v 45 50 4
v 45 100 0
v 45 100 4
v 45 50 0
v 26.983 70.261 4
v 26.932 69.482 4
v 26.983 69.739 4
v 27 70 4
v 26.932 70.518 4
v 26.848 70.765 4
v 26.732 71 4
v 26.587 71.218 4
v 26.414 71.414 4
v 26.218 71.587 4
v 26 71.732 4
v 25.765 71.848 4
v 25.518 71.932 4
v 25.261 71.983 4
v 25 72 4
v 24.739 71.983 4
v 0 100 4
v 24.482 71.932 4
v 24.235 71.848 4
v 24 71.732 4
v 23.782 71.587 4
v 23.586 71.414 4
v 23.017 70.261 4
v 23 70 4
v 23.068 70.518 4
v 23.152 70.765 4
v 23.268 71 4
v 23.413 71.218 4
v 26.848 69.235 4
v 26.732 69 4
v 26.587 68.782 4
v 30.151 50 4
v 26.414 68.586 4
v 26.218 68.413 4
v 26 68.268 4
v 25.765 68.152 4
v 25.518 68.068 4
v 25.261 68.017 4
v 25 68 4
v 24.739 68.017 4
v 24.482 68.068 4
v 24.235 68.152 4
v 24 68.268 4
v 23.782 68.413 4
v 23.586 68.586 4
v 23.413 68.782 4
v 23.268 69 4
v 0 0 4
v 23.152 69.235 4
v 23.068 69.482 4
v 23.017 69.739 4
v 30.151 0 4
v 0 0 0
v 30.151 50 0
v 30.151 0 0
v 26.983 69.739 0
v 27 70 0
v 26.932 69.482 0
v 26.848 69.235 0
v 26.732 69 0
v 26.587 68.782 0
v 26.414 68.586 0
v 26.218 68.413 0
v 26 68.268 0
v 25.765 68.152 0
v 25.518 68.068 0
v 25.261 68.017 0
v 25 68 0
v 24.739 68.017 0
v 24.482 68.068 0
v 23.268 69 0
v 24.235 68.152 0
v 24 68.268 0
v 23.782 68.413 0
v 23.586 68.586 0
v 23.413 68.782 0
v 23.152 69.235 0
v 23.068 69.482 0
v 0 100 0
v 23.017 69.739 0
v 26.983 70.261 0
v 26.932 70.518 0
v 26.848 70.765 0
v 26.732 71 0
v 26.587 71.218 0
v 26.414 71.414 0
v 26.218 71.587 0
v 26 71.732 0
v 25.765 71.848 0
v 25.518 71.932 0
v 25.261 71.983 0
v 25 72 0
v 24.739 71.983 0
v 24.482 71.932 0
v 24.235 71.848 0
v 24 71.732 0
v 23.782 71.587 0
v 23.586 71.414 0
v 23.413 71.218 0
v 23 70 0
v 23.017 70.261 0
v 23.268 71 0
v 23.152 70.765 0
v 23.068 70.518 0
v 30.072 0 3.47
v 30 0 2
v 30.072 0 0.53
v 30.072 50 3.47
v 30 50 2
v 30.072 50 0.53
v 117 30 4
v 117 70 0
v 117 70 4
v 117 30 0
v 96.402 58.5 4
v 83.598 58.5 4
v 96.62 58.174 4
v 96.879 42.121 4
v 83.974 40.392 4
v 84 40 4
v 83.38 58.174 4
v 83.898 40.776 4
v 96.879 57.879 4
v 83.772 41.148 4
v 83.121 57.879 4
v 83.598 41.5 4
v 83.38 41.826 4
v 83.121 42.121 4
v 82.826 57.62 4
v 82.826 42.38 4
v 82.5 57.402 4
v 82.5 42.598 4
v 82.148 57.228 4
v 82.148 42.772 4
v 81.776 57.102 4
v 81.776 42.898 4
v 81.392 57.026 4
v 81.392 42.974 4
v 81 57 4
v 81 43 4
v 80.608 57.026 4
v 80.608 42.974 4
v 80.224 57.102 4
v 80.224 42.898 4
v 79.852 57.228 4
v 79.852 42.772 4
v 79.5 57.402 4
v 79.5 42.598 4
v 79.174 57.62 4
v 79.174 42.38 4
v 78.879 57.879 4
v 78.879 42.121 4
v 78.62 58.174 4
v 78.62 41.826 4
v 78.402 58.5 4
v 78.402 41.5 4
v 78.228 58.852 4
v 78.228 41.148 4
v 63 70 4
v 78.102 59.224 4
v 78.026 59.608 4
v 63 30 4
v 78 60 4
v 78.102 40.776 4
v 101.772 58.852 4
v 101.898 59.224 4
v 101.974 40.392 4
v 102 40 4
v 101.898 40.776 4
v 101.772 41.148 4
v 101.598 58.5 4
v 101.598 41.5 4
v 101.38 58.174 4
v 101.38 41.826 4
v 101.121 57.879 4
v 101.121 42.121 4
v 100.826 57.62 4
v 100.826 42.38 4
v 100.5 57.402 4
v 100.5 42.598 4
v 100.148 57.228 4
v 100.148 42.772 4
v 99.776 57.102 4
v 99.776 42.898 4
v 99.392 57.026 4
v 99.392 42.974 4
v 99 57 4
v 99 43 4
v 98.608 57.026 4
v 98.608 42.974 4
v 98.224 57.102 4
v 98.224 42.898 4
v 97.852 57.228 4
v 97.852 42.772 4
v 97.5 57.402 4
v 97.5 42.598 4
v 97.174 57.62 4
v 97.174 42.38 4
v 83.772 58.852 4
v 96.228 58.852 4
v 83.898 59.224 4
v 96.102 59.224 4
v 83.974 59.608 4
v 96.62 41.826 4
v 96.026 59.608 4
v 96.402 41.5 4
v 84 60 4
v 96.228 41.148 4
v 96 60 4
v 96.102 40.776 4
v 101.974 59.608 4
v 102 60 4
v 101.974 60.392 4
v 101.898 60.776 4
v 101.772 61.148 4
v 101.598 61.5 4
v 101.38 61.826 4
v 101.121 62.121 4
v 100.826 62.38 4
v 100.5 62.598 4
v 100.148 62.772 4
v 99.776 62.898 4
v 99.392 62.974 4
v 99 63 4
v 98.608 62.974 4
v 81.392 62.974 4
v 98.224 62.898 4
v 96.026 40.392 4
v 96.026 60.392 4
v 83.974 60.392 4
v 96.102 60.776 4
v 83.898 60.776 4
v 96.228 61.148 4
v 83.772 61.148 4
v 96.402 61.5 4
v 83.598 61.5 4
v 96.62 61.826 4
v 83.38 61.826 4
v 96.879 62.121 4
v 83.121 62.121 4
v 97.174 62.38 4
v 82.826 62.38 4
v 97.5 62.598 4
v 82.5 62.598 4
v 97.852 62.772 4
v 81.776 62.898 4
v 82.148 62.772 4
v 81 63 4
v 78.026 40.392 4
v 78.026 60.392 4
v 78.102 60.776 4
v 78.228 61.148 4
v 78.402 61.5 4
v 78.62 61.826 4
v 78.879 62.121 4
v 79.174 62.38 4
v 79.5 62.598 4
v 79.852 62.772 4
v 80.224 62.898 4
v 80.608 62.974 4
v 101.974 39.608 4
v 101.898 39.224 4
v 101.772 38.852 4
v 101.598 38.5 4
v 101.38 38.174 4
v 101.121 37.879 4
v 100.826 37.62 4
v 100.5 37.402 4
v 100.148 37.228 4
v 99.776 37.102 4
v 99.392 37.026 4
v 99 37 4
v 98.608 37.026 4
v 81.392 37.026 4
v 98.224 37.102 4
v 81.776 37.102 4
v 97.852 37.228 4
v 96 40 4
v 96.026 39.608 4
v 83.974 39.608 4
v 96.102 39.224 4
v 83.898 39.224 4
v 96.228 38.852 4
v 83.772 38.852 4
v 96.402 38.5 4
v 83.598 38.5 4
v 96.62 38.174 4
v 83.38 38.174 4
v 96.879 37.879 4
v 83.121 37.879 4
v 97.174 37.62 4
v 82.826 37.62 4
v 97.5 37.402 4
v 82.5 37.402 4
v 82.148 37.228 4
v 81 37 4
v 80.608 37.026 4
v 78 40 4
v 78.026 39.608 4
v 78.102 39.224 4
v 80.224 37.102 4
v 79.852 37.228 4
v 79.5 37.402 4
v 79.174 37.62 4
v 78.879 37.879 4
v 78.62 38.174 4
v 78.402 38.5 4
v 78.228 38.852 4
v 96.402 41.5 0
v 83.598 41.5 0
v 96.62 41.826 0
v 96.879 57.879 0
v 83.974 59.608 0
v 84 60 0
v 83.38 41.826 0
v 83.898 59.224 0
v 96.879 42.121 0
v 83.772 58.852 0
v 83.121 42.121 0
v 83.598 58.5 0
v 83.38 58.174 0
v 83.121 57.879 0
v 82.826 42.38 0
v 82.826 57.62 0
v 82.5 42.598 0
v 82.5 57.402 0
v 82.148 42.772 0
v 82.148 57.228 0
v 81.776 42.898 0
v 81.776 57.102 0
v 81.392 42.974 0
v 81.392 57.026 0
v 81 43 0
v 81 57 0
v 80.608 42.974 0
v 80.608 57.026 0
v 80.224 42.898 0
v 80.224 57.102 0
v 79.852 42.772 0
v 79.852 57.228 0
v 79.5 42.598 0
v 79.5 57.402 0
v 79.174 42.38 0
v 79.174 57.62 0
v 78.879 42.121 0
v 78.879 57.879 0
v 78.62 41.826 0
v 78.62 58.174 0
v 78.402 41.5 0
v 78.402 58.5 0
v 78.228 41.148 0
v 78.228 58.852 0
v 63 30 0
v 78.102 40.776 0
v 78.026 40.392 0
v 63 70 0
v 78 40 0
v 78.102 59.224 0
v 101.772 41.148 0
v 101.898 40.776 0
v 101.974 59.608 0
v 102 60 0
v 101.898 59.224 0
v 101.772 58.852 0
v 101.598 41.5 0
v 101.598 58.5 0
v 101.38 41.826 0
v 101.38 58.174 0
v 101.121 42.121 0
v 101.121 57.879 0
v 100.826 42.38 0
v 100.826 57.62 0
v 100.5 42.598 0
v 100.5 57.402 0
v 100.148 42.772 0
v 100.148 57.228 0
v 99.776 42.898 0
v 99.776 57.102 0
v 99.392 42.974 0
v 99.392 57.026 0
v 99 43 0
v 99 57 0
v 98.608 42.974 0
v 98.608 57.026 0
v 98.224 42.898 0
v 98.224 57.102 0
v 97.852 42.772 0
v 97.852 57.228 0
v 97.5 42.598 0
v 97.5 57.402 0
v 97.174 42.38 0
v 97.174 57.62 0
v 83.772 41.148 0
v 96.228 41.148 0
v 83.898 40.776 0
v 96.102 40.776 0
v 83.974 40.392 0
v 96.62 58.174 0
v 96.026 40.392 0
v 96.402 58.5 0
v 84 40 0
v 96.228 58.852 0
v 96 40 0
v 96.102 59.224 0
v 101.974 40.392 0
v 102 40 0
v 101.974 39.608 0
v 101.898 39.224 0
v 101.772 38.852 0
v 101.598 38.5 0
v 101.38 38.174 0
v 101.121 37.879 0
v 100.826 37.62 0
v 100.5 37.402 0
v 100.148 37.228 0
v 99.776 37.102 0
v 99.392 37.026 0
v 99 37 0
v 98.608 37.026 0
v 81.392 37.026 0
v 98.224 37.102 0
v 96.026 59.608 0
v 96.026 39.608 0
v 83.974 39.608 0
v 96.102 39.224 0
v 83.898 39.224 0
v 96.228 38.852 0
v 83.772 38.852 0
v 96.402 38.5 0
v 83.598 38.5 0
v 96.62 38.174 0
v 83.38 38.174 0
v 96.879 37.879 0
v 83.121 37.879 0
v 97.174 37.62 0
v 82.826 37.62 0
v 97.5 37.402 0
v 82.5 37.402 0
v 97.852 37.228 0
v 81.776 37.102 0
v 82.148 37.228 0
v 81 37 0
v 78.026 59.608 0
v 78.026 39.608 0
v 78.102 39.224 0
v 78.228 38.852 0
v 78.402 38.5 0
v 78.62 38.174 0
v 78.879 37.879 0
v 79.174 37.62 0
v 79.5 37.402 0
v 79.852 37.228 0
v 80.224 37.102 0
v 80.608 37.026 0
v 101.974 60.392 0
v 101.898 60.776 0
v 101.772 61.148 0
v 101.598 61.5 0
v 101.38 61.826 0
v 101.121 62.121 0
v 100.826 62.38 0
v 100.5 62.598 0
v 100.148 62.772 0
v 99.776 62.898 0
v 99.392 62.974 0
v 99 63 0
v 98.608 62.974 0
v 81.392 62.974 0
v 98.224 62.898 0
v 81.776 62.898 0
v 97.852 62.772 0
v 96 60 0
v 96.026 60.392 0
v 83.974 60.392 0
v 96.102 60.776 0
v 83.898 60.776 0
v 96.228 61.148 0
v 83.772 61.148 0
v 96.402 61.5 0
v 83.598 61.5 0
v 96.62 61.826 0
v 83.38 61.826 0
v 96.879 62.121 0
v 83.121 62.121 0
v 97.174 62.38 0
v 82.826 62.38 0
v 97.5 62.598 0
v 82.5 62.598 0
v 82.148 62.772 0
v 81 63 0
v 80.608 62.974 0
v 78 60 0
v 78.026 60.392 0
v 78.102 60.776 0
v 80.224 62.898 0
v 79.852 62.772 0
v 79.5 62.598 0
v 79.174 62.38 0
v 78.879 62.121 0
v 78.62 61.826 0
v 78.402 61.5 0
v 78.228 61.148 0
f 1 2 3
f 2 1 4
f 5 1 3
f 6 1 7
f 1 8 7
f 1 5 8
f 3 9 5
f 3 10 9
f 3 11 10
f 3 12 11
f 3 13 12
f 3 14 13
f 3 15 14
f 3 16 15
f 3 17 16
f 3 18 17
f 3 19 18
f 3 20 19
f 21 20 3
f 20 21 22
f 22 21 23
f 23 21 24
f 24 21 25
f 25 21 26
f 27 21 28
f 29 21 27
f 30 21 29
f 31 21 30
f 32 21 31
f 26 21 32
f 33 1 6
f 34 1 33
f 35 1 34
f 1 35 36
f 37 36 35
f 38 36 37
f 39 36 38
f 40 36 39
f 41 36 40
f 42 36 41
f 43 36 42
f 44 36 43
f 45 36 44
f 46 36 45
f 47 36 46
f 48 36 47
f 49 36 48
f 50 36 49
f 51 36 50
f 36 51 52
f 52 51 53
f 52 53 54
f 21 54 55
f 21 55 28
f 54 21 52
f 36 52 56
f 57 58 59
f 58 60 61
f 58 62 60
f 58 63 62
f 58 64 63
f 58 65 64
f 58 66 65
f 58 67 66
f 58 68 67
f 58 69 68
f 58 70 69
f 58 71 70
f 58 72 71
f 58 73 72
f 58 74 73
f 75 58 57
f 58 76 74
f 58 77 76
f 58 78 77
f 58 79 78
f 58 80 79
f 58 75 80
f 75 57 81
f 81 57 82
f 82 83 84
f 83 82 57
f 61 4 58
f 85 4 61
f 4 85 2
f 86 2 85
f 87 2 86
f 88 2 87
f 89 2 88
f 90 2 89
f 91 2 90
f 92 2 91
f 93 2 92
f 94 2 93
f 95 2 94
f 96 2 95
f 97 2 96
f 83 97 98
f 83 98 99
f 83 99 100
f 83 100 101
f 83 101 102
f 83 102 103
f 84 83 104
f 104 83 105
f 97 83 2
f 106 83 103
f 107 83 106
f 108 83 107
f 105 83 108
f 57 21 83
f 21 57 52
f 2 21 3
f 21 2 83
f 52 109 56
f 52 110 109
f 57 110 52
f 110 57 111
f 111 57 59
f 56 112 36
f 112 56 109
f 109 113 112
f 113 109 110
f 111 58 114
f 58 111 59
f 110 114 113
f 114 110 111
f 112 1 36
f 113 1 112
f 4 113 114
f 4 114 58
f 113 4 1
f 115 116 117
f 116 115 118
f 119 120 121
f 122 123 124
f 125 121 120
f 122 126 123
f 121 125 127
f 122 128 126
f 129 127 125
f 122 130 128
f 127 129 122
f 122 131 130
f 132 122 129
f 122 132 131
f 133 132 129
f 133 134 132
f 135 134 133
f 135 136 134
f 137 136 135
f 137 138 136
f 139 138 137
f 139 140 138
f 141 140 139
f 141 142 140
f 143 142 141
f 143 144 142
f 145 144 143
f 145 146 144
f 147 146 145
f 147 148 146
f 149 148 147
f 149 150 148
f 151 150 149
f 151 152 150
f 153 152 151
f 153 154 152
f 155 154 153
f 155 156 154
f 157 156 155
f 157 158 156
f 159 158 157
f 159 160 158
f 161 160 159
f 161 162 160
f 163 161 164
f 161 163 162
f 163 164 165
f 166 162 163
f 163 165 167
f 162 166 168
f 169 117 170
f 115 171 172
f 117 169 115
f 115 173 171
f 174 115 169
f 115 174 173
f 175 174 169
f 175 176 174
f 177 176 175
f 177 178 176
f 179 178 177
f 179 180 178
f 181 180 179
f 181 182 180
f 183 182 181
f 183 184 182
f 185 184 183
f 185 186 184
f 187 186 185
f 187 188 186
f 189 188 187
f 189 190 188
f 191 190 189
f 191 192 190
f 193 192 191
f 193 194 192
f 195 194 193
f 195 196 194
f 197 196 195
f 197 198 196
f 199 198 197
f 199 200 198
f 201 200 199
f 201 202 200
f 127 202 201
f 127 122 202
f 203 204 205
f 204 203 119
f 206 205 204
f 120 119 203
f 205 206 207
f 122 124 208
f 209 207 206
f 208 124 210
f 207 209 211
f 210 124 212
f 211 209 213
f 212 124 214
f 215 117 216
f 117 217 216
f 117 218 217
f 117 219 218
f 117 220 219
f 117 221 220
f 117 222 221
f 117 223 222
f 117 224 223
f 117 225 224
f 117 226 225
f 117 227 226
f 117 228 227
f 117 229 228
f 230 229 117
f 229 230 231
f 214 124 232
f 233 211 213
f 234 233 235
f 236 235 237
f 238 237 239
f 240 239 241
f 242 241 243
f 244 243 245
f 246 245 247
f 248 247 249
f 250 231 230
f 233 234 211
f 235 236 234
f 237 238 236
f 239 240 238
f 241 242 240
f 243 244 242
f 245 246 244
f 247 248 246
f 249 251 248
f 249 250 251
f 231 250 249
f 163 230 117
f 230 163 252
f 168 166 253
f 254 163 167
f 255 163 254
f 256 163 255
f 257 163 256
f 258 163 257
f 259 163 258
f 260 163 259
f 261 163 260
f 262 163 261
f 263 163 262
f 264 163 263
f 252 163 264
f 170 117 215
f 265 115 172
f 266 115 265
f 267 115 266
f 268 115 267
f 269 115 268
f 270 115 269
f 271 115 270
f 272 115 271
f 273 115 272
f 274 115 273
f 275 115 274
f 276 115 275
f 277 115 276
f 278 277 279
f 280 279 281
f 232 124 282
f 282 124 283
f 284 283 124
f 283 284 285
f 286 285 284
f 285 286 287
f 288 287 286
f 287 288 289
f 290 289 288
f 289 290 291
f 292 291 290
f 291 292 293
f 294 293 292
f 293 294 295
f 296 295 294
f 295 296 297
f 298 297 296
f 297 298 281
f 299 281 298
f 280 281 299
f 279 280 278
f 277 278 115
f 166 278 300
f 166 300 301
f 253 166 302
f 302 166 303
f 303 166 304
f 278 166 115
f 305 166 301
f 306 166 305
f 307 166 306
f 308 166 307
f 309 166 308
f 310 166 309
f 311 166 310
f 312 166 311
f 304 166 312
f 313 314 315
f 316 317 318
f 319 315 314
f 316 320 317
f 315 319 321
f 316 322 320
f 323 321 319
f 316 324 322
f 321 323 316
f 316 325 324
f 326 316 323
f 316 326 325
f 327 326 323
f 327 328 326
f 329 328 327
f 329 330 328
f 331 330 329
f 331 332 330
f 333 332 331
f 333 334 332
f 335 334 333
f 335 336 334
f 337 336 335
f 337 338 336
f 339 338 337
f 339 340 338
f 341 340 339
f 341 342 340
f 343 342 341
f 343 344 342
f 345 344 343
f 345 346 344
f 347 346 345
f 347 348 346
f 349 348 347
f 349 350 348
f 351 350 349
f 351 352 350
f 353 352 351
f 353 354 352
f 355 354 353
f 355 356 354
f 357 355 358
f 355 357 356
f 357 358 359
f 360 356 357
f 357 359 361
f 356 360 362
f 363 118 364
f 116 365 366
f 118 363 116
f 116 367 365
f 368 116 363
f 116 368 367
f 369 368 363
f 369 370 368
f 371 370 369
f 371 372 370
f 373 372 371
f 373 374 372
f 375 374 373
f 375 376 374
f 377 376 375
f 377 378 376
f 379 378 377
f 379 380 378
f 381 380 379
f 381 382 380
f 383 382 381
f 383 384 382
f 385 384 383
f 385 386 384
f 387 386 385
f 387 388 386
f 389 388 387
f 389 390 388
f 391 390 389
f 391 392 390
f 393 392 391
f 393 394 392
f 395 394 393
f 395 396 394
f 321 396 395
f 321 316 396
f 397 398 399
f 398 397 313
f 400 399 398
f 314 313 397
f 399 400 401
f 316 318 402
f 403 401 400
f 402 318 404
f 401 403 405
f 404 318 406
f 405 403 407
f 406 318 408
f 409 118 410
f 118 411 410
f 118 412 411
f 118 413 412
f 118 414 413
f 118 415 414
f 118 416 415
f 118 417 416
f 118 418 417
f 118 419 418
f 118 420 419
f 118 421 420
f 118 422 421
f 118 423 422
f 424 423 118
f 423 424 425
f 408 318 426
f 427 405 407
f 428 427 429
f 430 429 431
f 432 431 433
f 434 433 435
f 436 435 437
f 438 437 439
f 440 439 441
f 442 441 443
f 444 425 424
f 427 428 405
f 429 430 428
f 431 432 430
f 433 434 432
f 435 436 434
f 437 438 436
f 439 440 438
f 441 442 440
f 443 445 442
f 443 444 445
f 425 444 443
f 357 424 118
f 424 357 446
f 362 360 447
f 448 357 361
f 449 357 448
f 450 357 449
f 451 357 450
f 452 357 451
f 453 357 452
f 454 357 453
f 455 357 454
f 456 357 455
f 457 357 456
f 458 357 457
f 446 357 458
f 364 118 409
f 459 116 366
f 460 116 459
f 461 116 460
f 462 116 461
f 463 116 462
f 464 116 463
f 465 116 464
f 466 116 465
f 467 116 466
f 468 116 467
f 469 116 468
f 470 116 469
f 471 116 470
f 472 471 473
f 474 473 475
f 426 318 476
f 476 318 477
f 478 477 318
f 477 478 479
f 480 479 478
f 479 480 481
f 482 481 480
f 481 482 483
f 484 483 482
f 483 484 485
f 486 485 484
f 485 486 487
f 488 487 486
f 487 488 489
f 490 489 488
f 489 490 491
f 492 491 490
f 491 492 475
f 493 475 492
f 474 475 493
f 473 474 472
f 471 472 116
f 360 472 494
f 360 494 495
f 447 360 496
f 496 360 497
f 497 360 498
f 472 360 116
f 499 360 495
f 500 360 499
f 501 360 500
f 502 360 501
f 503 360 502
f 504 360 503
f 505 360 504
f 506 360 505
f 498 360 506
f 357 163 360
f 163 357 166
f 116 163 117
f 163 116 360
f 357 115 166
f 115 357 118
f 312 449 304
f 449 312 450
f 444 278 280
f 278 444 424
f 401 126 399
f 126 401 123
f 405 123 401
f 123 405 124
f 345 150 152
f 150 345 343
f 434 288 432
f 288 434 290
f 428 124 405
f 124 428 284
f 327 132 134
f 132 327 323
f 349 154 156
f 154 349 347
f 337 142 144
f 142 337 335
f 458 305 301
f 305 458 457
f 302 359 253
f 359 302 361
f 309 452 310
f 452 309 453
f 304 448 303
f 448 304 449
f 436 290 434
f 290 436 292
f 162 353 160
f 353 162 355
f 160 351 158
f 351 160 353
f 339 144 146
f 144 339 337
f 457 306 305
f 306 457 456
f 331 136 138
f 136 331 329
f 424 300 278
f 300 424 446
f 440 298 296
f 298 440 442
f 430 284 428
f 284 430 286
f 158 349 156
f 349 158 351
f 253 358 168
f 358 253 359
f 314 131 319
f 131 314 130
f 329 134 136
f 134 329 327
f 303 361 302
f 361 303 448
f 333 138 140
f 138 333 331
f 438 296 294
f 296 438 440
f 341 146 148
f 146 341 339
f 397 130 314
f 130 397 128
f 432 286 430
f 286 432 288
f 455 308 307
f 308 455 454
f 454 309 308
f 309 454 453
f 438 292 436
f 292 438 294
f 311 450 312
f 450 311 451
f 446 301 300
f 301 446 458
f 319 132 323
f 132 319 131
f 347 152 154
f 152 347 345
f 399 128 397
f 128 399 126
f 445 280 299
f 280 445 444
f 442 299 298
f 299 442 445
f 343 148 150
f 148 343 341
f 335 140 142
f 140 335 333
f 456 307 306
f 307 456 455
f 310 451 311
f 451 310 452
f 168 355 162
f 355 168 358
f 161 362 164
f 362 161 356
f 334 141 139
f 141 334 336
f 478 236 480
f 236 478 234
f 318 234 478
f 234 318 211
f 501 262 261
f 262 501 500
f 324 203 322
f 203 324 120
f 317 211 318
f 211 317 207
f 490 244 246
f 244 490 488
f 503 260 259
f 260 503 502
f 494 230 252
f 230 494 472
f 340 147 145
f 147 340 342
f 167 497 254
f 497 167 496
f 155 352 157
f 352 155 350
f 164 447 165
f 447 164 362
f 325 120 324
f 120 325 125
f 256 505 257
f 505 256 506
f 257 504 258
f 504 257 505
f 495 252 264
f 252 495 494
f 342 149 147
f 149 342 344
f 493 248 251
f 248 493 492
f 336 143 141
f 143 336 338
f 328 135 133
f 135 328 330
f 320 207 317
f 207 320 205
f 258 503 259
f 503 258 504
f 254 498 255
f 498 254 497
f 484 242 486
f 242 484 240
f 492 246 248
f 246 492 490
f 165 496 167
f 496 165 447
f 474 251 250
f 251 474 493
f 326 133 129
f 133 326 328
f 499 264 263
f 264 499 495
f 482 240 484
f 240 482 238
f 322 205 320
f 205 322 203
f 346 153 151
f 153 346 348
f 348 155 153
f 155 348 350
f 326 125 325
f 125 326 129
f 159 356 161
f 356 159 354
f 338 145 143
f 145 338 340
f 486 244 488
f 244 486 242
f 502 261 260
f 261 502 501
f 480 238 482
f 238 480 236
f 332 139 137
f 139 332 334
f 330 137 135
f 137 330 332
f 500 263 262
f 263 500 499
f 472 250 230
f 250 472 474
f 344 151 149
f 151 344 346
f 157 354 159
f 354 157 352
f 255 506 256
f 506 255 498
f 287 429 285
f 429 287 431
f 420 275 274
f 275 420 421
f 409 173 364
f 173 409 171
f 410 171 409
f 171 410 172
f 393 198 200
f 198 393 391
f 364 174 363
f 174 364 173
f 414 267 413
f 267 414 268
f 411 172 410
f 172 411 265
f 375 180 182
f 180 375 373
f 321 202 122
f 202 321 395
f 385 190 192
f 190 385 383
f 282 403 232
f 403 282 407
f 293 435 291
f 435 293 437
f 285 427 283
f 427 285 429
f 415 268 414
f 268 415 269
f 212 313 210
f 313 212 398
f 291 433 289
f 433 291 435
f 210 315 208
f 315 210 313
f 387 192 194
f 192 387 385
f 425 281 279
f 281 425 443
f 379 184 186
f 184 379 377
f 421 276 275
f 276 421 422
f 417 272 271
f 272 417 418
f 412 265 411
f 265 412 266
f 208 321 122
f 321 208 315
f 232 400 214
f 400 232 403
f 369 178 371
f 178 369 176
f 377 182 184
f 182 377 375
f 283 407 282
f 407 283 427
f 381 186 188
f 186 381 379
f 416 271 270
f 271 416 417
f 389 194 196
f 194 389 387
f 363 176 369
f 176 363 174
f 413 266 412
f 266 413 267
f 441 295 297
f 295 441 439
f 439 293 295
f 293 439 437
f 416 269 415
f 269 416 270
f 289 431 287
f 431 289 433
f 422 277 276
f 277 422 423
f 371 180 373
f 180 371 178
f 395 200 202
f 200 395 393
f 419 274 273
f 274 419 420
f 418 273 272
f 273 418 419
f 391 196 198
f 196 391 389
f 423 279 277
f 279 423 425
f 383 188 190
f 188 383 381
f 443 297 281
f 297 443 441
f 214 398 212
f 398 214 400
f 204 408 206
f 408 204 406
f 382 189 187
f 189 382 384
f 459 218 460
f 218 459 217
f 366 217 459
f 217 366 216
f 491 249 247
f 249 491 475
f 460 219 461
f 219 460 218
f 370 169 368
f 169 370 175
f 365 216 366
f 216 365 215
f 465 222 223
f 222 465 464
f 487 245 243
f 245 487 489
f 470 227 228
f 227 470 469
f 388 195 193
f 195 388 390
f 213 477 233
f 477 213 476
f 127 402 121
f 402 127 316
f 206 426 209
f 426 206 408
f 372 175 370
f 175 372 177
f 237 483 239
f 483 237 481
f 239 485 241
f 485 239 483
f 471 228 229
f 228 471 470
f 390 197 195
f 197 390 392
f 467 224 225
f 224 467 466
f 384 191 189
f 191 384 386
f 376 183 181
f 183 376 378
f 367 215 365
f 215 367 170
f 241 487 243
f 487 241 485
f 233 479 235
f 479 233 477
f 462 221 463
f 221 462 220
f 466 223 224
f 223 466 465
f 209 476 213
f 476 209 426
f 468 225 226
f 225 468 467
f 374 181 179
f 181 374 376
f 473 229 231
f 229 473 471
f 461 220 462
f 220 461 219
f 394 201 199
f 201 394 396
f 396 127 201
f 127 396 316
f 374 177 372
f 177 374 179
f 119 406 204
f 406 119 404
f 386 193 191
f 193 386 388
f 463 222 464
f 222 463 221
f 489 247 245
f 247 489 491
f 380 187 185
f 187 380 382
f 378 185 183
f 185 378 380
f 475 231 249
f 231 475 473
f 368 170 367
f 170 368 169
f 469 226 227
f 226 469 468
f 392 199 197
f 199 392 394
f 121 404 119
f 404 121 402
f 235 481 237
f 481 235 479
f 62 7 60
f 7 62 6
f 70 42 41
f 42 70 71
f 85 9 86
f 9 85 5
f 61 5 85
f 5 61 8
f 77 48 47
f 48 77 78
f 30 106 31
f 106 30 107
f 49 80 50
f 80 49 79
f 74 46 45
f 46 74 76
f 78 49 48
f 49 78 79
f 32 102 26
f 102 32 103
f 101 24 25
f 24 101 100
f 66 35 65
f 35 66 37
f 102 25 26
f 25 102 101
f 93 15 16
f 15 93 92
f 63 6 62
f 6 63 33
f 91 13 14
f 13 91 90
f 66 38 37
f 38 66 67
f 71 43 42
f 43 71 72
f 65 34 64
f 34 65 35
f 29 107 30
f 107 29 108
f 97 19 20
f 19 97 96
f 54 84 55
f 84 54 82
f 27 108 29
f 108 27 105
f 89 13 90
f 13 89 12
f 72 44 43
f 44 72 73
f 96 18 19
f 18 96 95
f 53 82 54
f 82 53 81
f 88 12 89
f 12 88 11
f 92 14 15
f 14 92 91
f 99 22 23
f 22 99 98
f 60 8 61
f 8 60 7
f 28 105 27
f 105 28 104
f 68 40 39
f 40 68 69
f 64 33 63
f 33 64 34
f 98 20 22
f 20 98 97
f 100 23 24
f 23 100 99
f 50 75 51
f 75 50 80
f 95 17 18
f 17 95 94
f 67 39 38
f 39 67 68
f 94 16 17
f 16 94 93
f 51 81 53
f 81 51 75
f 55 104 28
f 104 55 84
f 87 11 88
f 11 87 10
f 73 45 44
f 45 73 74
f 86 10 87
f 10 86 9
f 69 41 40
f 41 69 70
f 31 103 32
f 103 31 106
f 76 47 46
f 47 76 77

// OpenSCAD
// RADAR MOUNT BRACKET — wall/pole attachment
// Print: PA6-CF 0.16mm (highest structural strength, weather)
// Mounts the radar enclosure to a pole, wall, or fence
// 5 brackets for 5 radars
//
// Print: PA6-CF, ~30min per bracket

/* [Bracket Dimensions] */
BRACKET_W = 90;        // mm horizontal span
BRACKET_H = 100;       // mm vertical
BRACKET_THICK = 4;     // mm base thickness
POLE_DIA = 30;          // mm pole diameter (curved back)
WALL_HOLE_DIA = 6;      // mm M5 wall anchor hole

$fn = 48;

// The pole-clamp half (curved back)
module pole_clamp_half() {
    difference() {
        translate([0, 0, 0])
            cube([BRACKET_W/2, BRACKET_H, BRACKET_THICK]);
        translate([BRACKET_W/2, BRACKET_H/2, BRACKET_THICK/2])
            rotate([0, 0, 0])
            rotate([90, 0, 0])
            cylinder(h=BRACKET_H+1, d=POLE_DIA, $fn=64);
    }
}

difference() {
    union() {
        // Pole clamp
        pole_clamp_half();
        // Mount plate (extends to side with M5 holes)
        translate([BRACKET_W*0.7, BRACKET_H*0.3, 0])
            cube([BRACKET_W*0.6, BRACKET_H*0.4, BRACKET_THICK]);
    }
    // 4× M5 wall mount holes
    translate([BRACKET_W*0.9, BRACKET_H*0.4, -1])
        cylinder(h=BRACKET_THICK+2, d=WALL_HOLE_DIA);
    translate([BRACKET_W*0.9, BRACKET_H*0.6, -1])
        cylinder(h=BRACKET_THICK+2, d=WALL_HOLE_DIA);
    translate([BRACKET_W*1.1, BRACKET_H*0.4, -1])
        cylinder(h=BRACKET_THICK+2, d=WALL_HOLE_DIA);
    translate([BRACKET_W*1.1, BRACKET_H*0.6, -1])
        cylinder(h=BRACKET_THICK+2, d=WALL_HOLE_DIA);
    // Mount hole for the enclosure (M3 bolt to attach bottom)
    translate([25, BRACKET_H*0.7, -1])
        cylinder(h=BRACKET_THICK+2, d=4);
}
